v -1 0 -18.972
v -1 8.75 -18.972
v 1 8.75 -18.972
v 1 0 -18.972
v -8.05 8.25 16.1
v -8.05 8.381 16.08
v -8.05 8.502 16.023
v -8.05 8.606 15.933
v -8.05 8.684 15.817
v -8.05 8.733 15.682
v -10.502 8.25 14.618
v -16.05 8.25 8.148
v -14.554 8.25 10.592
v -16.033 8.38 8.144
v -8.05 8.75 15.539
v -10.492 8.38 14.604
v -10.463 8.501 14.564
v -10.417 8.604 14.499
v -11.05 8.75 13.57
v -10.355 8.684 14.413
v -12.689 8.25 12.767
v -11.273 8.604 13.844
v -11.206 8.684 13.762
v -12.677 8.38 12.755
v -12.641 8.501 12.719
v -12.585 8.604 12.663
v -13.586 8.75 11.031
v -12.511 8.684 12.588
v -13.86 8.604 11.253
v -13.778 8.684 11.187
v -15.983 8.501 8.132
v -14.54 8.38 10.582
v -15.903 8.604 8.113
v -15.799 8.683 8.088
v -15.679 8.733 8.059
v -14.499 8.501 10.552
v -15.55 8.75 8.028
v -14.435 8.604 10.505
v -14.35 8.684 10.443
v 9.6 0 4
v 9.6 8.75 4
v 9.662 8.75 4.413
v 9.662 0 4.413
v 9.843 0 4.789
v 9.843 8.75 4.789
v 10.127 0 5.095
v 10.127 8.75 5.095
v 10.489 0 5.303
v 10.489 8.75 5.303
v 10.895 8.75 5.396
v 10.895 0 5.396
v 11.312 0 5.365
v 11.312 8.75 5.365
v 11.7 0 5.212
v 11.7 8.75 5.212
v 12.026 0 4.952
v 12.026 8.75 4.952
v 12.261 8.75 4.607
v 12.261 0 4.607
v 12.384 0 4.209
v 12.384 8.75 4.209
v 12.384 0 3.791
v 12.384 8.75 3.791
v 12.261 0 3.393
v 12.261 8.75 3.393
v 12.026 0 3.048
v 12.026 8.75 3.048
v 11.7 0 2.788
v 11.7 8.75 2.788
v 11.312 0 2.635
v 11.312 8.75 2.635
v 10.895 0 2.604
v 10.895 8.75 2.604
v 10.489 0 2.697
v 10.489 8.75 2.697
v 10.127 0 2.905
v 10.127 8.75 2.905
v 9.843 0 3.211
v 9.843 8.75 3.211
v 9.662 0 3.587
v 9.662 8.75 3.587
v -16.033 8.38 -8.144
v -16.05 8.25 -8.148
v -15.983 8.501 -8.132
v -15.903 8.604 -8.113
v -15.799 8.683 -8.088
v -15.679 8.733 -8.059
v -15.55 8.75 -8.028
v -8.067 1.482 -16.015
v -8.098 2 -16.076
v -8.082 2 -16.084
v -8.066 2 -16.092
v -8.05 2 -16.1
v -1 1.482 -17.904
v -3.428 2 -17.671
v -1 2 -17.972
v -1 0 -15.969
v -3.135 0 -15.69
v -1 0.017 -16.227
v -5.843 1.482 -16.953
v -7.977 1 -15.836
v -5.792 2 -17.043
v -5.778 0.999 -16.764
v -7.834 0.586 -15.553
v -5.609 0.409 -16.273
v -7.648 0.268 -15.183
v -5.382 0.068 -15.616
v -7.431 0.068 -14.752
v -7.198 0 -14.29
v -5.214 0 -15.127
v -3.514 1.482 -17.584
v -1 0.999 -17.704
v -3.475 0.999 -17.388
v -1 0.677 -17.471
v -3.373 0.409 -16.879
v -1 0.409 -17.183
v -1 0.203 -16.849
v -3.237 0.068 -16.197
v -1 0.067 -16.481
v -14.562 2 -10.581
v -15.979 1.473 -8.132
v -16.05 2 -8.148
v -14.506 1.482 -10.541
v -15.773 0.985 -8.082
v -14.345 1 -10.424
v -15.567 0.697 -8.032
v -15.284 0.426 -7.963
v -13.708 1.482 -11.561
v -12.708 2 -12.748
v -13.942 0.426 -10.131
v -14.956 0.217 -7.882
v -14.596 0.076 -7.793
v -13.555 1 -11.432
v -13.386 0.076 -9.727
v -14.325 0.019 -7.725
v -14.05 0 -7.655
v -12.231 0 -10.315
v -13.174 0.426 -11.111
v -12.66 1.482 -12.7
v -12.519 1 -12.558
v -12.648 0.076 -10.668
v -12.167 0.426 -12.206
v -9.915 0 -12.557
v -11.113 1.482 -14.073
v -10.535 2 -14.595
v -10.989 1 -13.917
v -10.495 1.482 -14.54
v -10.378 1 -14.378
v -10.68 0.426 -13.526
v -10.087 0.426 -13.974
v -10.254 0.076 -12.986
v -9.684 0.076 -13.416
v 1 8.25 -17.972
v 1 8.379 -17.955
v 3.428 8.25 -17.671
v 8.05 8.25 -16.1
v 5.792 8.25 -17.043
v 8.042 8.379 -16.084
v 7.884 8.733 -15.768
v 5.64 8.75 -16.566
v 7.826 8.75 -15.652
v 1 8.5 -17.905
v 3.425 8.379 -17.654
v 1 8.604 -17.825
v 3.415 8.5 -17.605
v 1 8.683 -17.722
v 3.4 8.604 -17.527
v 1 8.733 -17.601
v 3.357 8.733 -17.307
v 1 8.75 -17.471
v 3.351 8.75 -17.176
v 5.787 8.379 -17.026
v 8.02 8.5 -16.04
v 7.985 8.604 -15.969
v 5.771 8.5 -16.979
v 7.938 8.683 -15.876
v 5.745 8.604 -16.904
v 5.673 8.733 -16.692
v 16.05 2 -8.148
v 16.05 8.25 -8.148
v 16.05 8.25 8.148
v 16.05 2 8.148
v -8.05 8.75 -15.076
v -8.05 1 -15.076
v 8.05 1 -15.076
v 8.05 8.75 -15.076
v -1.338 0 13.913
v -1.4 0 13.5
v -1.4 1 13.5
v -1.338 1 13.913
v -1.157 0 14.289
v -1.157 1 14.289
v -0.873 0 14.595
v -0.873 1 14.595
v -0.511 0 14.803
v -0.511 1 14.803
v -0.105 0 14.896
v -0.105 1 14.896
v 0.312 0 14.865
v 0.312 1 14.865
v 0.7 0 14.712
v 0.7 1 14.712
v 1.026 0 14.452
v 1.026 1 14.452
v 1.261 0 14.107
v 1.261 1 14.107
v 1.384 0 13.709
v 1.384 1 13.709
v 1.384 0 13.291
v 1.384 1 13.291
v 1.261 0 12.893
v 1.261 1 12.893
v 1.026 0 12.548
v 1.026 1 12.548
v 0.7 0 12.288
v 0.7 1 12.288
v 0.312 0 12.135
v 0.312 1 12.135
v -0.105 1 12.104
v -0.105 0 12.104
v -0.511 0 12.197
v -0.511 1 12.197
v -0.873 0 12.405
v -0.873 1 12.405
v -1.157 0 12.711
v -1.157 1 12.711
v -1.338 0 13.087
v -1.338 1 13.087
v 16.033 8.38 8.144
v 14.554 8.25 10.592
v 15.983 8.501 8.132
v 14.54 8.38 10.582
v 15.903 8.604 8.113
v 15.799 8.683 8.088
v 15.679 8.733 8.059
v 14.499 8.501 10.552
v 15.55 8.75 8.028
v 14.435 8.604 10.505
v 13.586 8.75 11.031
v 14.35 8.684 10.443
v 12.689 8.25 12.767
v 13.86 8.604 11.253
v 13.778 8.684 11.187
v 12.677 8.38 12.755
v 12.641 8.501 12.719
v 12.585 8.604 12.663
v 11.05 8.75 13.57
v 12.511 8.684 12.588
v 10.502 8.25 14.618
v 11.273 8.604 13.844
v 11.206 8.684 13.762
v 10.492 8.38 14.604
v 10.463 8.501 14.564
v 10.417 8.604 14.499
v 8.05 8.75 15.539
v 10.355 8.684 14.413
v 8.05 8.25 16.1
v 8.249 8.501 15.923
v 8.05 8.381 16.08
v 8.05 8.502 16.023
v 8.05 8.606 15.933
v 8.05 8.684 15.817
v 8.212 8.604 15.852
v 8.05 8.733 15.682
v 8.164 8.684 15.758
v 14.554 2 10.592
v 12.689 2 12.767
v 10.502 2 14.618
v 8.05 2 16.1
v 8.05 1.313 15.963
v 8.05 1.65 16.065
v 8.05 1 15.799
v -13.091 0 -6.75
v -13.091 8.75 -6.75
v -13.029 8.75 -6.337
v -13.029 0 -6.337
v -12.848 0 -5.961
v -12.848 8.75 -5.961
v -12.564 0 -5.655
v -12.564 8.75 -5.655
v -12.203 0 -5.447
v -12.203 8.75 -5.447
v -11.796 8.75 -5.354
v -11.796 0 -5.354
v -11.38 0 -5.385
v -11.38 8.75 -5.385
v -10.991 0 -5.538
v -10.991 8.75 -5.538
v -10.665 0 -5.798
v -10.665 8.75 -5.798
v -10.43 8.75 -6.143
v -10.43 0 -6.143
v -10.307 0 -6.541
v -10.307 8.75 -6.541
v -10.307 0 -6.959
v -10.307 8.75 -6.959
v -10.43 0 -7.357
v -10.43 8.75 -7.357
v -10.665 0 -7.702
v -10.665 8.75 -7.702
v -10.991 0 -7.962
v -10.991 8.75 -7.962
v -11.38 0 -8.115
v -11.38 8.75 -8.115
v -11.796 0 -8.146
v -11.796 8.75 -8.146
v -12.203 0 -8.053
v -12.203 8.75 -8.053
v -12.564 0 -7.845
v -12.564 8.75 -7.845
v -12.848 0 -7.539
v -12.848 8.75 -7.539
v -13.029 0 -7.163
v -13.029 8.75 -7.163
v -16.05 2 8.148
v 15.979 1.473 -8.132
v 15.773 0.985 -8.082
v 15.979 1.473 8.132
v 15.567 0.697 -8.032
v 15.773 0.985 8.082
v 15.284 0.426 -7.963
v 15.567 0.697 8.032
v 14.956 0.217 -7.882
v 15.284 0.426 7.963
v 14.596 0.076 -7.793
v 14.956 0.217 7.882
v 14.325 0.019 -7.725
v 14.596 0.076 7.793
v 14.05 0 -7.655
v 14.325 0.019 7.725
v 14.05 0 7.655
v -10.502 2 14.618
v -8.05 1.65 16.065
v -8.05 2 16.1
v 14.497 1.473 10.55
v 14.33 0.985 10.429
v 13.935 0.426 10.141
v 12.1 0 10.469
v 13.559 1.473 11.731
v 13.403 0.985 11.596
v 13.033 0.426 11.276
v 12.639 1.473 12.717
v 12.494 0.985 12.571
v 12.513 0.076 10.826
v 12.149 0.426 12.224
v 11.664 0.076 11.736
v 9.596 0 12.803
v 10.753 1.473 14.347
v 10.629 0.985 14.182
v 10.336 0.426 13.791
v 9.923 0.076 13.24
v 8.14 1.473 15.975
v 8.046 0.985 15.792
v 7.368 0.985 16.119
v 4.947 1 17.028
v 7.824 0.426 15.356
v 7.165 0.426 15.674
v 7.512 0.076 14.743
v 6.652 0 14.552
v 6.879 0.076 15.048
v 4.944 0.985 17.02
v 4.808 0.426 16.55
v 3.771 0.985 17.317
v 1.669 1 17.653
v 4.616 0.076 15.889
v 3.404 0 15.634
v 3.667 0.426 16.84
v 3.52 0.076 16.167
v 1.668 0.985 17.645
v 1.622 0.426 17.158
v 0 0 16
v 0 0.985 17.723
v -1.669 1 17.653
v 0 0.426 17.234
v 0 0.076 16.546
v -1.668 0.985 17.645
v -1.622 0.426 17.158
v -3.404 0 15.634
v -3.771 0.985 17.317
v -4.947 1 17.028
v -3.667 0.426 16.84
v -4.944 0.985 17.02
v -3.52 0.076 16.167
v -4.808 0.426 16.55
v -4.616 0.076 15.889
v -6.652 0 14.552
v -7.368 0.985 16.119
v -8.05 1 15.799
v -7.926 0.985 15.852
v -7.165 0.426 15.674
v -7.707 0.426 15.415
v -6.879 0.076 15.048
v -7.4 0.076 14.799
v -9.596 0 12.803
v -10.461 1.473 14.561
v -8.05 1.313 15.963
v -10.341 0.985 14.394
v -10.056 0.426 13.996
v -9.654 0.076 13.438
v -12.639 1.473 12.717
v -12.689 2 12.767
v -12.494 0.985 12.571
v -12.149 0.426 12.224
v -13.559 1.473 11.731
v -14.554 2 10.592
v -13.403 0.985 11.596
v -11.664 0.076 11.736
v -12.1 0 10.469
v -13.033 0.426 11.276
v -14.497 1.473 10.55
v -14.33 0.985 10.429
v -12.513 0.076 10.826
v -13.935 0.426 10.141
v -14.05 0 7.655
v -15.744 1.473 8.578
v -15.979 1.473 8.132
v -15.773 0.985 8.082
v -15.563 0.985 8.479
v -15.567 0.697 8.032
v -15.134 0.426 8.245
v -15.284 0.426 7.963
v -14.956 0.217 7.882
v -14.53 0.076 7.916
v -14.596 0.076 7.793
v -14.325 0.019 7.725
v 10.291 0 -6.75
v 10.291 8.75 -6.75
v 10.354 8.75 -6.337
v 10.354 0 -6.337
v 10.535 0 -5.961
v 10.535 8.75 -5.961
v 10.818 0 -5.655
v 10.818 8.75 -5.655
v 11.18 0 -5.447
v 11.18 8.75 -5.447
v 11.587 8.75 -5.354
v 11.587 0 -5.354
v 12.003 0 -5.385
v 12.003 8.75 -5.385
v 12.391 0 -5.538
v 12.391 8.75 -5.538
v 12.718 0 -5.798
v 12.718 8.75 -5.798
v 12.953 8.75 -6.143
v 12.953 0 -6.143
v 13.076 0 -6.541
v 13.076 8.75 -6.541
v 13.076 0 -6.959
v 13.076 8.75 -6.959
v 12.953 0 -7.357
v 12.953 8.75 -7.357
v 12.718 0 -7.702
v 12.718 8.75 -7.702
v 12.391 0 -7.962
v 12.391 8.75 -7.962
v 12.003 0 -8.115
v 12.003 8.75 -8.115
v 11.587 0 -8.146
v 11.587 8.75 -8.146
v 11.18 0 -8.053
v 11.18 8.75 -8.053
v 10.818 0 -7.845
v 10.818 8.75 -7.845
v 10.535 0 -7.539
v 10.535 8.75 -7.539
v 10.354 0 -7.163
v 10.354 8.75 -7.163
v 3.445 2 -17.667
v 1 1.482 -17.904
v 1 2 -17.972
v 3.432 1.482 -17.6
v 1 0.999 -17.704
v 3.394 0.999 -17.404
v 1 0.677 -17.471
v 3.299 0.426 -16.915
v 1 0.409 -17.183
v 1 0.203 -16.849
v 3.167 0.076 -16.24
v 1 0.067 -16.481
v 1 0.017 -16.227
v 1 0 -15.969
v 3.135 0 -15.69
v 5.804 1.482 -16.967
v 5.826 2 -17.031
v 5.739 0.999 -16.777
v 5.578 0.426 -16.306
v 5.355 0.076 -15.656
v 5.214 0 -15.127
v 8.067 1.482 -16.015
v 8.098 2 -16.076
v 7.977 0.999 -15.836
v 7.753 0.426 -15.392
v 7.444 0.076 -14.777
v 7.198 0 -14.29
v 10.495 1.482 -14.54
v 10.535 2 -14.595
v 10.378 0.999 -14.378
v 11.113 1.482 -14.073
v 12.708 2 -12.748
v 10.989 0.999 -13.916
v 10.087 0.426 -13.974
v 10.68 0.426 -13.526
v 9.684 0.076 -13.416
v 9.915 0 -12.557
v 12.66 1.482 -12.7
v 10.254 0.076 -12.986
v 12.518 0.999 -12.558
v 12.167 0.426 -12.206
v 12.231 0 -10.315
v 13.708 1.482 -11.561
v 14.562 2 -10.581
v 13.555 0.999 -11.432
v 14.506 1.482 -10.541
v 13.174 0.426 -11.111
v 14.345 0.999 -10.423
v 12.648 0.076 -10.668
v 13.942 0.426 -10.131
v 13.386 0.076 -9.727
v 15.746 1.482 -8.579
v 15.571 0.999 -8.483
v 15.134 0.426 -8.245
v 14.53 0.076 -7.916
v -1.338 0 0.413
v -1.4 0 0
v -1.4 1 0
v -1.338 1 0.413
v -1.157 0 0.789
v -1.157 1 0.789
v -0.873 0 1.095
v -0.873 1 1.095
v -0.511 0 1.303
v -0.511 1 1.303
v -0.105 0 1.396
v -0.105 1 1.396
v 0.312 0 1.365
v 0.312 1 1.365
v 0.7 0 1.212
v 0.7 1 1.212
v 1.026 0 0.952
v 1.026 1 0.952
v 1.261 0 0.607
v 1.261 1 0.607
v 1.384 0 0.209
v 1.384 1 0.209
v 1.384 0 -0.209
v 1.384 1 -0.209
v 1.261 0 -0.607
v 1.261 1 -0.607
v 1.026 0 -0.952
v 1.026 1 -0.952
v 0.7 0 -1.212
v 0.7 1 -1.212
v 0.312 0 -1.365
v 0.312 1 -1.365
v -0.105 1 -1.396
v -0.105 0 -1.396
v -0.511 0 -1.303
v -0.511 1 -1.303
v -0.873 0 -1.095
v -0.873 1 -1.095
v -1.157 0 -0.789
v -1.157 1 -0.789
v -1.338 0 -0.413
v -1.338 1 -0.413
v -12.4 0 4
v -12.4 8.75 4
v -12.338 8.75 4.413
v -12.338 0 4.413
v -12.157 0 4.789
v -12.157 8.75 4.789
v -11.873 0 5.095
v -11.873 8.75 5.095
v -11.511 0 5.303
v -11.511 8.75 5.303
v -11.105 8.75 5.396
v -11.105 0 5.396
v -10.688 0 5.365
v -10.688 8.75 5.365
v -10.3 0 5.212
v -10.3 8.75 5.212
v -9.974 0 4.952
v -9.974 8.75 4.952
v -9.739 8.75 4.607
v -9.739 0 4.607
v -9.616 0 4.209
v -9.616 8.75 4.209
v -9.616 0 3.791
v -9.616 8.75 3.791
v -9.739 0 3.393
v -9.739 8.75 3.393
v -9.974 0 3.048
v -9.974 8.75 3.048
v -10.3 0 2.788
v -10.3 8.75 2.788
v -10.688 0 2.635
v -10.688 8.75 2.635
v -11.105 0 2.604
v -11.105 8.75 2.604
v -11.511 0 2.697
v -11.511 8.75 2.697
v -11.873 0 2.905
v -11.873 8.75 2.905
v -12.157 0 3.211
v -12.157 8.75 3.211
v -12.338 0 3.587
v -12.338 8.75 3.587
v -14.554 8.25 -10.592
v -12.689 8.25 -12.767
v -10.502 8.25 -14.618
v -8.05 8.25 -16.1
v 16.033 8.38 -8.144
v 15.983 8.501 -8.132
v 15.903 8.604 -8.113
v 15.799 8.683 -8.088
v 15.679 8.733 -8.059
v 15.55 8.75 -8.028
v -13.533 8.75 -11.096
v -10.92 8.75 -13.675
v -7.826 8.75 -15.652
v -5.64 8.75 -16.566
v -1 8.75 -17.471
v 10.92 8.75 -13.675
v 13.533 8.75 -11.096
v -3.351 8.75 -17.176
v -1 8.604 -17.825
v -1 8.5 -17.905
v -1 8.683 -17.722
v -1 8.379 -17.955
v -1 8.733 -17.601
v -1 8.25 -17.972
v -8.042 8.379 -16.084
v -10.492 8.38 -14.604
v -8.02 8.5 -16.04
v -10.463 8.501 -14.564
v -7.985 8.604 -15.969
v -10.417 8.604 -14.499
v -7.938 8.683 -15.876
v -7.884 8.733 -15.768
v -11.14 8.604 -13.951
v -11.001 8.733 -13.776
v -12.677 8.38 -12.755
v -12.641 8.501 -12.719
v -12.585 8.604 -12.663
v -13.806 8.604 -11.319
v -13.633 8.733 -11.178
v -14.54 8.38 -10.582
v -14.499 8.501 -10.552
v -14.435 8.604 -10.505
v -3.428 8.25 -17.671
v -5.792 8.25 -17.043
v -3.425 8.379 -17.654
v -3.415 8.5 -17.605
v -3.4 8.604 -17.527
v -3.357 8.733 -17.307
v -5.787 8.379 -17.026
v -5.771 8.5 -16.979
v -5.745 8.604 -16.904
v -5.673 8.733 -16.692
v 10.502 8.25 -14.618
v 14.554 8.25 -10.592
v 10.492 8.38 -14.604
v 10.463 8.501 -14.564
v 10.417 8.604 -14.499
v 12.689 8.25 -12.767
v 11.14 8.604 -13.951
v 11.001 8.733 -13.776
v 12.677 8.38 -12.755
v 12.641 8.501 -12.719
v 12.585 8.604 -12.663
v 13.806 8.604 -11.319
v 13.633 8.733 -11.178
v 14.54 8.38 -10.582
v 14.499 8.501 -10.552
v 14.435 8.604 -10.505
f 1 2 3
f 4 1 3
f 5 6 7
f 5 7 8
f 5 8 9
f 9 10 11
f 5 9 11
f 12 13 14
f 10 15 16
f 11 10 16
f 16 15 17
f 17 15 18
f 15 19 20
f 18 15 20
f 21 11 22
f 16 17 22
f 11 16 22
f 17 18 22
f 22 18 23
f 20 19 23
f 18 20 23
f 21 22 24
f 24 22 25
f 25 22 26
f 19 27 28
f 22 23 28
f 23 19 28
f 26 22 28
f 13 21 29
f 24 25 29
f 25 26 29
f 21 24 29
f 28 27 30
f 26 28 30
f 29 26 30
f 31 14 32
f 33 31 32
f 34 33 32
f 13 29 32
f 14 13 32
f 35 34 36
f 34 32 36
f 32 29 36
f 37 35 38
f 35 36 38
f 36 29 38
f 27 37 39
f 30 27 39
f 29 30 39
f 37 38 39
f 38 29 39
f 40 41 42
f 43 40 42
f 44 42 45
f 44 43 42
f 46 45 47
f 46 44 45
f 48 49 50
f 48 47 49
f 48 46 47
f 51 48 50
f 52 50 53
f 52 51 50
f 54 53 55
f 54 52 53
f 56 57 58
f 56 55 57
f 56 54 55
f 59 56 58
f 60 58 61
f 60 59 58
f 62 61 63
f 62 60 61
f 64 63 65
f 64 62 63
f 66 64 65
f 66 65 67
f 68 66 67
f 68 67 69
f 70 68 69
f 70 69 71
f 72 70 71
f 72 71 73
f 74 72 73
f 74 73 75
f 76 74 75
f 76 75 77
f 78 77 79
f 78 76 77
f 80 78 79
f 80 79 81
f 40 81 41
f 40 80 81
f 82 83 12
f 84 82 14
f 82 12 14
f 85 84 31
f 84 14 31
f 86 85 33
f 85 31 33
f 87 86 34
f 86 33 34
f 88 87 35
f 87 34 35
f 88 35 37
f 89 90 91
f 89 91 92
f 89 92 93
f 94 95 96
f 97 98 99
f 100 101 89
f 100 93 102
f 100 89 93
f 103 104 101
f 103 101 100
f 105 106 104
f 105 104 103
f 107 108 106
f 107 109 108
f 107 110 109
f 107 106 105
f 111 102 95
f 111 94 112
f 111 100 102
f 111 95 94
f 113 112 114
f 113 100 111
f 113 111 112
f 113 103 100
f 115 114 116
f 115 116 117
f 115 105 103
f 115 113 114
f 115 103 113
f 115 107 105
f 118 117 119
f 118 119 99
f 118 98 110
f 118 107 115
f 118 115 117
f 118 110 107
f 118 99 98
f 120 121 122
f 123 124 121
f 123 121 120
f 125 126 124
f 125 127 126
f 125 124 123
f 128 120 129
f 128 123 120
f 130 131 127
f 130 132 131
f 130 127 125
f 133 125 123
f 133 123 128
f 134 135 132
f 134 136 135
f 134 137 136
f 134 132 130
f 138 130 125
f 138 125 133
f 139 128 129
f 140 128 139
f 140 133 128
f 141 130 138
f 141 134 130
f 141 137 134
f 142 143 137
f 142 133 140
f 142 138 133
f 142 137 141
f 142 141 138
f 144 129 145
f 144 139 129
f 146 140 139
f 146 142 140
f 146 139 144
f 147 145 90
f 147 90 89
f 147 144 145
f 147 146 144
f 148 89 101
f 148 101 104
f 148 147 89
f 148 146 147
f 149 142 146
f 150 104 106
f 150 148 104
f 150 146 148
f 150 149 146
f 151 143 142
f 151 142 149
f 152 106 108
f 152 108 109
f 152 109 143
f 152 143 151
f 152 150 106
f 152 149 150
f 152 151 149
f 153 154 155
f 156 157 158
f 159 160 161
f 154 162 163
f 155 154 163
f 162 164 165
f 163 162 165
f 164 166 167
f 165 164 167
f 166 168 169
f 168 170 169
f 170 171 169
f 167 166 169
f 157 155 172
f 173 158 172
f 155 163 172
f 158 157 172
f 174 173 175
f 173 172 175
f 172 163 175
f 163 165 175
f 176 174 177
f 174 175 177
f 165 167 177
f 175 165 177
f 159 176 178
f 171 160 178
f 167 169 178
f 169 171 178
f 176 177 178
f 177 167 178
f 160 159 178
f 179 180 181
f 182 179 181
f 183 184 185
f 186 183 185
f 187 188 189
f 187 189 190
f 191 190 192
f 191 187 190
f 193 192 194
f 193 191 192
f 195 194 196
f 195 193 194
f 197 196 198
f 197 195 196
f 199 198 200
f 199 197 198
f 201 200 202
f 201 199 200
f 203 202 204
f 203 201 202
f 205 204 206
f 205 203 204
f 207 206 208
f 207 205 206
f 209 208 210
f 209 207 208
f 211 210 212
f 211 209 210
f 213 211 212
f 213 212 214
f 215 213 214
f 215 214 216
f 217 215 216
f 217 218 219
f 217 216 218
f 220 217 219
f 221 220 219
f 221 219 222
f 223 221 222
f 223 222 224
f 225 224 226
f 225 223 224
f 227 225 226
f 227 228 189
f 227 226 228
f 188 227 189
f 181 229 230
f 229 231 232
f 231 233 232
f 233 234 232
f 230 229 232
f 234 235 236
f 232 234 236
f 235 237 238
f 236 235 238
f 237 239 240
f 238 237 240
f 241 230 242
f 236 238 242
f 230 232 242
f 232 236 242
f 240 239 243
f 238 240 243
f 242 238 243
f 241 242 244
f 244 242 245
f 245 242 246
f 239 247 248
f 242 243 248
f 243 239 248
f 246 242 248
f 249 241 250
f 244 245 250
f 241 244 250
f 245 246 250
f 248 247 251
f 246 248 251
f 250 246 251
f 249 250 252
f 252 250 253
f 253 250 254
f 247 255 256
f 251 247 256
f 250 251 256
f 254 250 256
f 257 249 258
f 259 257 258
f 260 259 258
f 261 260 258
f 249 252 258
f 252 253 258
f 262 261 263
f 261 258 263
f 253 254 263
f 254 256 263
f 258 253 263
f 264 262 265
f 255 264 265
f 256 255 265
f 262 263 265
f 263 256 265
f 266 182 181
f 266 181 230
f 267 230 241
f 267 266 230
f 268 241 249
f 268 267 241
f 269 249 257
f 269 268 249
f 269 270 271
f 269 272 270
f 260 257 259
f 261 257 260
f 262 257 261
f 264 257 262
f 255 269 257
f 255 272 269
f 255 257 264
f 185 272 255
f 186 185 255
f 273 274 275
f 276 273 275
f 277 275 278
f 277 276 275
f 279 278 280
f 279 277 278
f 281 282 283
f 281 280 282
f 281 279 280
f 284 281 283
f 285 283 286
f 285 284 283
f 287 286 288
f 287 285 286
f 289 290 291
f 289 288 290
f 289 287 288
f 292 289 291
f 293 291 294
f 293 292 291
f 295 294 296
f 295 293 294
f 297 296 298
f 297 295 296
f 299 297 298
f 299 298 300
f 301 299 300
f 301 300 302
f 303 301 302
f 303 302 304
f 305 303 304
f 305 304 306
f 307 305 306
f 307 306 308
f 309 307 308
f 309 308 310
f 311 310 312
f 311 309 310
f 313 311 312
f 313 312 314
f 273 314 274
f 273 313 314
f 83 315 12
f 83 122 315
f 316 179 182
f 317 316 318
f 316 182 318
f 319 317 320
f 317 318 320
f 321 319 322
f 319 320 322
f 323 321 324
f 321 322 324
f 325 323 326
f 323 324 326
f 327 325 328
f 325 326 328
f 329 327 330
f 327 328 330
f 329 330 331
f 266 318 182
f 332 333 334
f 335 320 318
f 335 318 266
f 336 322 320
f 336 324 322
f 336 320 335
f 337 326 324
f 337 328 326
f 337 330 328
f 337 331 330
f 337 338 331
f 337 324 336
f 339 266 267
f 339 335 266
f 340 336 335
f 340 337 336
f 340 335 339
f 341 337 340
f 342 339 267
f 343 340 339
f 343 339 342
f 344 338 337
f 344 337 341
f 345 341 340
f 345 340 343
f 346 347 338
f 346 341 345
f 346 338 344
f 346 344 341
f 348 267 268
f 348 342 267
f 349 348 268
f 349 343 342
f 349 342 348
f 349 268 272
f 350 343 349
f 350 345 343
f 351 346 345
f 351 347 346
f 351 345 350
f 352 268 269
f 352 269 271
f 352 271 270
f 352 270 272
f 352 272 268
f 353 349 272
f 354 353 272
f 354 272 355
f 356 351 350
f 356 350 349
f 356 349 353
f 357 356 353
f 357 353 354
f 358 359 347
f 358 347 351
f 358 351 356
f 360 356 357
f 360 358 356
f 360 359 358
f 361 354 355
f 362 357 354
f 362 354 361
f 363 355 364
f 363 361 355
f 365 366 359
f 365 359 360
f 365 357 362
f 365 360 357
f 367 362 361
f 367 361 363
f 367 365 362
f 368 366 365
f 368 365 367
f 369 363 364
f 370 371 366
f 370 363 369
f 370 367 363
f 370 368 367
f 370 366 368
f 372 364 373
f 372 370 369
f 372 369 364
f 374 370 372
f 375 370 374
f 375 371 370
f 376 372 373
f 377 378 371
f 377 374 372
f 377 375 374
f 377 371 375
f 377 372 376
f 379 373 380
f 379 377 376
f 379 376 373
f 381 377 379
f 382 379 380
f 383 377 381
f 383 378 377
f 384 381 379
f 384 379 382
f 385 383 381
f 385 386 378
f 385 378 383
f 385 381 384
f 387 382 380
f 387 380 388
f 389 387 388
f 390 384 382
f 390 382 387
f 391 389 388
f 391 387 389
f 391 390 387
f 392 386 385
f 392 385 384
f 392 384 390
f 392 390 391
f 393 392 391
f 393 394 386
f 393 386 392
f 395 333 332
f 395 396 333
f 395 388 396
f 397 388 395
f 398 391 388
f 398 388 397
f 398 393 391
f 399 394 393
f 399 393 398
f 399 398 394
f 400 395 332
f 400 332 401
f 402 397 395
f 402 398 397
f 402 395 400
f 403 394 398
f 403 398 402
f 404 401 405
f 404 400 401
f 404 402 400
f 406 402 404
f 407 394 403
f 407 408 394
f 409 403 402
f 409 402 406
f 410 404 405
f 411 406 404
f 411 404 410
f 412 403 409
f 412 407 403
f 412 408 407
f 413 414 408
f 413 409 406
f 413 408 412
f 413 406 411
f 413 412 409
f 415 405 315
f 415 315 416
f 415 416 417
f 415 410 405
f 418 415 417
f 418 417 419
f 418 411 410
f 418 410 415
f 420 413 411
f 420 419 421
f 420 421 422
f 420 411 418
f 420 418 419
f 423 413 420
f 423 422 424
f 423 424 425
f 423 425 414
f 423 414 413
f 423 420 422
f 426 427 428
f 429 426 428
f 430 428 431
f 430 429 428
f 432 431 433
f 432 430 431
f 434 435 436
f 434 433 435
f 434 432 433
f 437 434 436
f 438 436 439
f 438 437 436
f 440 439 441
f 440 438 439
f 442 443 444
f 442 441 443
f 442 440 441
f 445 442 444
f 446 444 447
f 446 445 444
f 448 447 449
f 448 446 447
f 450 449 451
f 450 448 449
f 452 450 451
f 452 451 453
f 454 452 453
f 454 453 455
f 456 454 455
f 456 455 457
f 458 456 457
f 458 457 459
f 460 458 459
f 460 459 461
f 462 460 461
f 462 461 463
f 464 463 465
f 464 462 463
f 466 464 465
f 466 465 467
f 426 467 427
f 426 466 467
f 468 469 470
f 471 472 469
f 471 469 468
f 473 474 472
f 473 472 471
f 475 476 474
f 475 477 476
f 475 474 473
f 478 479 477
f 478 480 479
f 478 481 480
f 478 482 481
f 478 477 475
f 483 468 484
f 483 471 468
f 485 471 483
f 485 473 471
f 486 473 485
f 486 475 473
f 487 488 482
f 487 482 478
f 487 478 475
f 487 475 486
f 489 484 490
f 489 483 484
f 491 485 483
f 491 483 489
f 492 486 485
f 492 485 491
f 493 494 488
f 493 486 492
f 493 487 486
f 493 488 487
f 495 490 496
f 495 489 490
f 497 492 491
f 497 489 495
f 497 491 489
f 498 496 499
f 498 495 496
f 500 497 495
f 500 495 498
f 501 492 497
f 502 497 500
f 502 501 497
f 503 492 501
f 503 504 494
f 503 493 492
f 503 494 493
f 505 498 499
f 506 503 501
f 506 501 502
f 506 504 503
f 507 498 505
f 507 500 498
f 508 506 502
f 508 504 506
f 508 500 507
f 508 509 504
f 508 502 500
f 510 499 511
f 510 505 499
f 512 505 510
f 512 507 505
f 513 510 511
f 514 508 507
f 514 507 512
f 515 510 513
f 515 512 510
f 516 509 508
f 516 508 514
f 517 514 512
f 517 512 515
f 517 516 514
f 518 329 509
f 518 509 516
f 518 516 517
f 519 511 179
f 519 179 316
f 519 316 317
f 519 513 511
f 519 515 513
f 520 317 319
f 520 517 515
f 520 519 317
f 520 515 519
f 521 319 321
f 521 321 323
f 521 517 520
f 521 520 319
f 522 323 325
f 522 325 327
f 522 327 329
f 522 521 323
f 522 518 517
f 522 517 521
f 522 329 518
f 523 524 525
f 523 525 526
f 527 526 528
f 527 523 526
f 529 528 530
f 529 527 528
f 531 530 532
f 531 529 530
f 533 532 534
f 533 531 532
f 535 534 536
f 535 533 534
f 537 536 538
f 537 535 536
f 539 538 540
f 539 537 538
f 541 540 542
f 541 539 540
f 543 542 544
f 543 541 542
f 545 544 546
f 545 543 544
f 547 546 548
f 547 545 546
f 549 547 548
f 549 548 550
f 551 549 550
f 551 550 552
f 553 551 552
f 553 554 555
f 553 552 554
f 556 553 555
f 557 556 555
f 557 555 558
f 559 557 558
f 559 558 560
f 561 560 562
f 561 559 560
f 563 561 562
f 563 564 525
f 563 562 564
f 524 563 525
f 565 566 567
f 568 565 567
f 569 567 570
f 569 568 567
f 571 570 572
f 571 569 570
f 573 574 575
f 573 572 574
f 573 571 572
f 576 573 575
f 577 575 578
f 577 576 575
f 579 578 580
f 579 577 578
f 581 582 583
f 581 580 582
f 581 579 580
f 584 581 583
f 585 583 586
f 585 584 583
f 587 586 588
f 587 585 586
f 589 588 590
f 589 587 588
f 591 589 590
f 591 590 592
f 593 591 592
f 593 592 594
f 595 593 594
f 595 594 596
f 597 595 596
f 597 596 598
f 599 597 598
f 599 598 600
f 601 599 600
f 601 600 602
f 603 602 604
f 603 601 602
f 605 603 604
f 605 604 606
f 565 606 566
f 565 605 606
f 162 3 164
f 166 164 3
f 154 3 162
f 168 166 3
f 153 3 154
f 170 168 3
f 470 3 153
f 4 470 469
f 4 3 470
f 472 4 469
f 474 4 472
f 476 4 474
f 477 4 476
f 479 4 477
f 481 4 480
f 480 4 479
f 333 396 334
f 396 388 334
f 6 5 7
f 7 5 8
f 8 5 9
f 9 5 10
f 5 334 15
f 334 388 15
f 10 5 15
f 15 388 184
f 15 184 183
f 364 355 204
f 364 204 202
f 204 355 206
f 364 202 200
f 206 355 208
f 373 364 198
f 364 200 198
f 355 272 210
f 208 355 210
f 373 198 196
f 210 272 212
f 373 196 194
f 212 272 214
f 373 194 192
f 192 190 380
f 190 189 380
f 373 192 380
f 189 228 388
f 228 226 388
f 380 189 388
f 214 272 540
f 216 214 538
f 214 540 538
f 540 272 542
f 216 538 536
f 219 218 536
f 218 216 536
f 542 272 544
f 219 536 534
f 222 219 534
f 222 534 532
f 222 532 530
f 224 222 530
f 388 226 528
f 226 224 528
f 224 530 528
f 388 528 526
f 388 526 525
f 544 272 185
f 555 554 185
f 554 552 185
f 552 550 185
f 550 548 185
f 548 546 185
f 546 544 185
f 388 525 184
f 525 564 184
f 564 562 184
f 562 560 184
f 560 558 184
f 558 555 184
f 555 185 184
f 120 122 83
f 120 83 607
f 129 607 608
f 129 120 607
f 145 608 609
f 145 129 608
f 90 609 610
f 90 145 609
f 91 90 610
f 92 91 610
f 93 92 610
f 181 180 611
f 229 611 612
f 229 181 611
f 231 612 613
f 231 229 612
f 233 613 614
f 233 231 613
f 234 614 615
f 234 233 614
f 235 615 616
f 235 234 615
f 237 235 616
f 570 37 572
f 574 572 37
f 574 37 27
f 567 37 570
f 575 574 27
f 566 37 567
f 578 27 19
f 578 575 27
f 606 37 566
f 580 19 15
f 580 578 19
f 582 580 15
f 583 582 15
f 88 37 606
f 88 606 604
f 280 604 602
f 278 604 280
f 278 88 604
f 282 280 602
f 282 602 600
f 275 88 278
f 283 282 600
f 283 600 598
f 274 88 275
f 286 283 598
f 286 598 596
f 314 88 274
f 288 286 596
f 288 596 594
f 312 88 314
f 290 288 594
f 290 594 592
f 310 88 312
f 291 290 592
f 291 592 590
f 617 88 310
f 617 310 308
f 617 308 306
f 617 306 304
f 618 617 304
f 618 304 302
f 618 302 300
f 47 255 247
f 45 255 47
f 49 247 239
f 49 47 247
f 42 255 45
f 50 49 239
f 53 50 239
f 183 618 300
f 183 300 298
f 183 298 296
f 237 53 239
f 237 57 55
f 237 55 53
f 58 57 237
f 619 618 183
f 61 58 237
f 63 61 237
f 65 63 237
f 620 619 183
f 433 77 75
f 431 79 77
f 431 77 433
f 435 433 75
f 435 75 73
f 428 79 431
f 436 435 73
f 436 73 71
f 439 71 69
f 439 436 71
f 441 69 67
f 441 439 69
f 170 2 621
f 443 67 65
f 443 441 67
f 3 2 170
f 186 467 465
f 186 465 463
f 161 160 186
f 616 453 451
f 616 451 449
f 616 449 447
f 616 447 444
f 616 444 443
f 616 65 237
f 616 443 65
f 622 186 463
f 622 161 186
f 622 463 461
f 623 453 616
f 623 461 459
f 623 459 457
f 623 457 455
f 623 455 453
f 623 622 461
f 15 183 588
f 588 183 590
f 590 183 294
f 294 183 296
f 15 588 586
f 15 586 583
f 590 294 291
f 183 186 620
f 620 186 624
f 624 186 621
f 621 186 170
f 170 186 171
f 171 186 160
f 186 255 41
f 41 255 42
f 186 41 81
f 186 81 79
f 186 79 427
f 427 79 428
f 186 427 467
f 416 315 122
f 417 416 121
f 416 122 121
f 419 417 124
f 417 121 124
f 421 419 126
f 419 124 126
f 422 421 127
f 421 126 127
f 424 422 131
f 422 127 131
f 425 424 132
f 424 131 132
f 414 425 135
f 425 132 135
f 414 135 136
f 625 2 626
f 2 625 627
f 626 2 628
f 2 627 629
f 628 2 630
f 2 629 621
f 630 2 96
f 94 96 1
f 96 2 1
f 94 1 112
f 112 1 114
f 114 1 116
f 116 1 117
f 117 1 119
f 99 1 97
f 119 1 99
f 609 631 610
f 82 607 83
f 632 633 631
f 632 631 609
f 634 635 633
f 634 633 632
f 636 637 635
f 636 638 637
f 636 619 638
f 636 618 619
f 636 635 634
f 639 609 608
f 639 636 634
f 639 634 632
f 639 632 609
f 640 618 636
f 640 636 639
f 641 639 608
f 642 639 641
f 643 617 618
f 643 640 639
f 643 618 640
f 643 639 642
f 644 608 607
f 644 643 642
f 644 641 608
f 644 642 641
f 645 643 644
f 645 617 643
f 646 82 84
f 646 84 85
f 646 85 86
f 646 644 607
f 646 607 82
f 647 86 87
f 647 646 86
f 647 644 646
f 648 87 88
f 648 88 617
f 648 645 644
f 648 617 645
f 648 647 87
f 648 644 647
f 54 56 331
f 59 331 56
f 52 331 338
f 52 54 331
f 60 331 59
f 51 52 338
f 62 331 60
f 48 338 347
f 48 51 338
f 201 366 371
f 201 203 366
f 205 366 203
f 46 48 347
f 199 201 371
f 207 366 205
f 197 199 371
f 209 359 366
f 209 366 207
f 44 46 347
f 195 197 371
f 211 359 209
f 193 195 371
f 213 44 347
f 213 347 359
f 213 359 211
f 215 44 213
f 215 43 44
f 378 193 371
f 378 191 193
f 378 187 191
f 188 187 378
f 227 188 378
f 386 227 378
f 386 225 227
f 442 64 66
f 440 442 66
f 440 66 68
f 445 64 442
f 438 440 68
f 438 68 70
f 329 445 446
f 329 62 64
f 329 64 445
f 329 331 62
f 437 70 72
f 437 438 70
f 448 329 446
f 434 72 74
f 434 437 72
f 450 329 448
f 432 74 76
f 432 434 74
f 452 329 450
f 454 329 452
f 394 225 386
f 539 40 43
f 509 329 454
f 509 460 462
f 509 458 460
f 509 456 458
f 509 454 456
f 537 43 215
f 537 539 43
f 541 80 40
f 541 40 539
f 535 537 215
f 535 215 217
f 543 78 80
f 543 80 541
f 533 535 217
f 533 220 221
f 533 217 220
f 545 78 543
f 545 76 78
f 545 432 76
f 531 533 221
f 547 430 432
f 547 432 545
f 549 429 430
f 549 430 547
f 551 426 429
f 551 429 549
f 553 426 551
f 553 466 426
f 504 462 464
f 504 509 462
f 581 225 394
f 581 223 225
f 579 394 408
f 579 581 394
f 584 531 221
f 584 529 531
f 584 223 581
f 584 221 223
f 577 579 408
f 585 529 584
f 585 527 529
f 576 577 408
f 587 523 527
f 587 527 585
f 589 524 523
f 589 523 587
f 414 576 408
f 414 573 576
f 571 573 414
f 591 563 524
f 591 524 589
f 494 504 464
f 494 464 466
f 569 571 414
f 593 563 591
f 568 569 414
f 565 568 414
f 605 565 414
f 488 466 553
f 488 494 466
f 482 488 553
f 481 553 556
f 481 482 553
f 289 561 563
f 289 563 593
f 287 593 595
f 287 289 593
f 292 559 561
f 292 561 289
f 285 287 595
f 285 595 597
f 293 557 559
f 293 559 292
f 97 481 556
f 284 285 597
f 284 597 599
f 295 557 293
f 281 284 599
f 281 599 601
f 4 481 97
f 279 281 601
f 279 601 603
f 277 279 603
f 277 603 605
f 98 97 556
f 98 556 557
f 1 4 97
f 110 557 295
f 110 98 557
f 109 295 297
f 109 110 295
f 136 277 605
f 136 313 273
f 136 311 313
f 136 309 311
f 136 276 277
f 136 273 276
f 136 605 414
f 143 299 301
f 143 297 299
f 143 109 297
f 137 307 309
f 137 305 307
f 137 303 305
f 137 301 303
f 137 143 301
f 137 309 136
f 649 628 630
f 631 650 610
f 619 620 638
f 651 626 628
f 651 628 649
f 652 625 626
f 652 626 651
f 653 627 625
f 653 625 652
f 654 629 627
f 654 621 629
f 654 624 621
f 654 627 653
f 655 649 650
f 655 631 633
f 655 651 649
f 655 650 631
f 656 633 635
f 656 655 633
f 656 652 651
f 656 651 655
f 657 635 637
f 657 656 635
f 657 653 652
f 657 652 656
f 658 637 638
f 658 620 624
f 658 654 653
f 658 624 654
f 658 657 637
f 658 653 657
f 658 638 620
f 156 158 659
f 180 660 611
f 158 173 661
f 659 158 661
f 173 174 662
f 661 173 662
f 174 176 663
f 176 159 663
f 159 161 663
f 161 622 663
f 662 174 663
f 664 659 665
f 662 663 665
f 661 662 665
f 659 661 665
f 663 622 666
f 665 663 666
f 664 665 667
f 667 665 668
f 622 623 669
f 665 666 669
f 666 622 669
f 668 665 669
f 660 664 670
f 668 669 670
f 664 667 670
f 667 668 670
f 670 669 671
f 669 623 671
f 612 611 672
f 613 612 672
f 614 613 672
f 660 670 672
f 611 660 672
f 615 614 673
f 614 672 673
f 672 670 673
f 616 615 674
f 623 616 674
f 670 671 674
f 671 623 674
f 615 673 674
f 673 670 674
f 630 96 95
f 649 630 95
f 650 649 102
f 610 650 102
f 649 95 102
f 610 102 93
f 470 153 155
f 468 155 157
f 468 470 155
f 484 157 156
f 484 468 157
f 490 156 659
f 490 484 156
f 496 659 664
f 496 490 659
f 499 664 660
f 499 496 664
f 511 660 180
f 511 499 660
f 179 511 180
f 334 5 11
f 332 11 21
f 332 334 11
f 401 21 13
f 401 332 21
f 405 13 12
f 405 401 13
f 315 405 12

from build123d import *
from build123d.topology import SkipClean

# Parameters (mm, degrees)
BOSS_EXTRUDE1_DEPTH      = 1
BOSS_EXTRUDE2_DEPTH      = 18
BOSS_EXTRUDE2_DEPTH_BACK = 18.972201
SKETCH2_W                = 8
SKETCH2_H                = 7.75
SKETCH3_R                = 59.910539196
CUT_EXTRUDE1_DEPTH       = 28.577289765
CUT_EXTRUDE2_DEPTH       = 28.577289597
CUT_EXTRUDE2_DEPTH_BACK  = 28.577289597
SKETCH5_R                = 1.4
BOSS_EXTRUDE3_DEPTH      = 8.75
CUT_EXTRUDE3_DEPTH       = 28.276489905
FILLET1_R                = 2
FILLET2_R                = 0.5


with BuildPart() as part:
    # Sketch1 → Boss-Extrude1 (new body)
    with BuildSketch(Plane(origin=(0, 0, 0), x_dir=(1, 0, 0), z_dir=(0, 1, 0))):
        with BuildLine():
            Line((-1, 17.972200756), (-1, 18.972200756))
            Line((-1, 18.972200756), (1, 18.972200756))
            Line((1, 18.972200756), (1, 17.972200756))
            ThreePointArc((1, 17.972200756), (0, -18), (-1, 17.972200756))
        make_face()
    extrude(amount=BOSS_EXTRUDE1_DEPTH)

    # Sketch2 → Boss-Extrude2 (add, two sides: drawn at the far end of the back side and taken through both)
    with BuildSketch(Plane.XY.offset(-BOSS_EXTRUDE2_DEPTH_BACK)):
        with Locations((-12.05, 4.875)):
            Rectangle(SKETCH2_W, SKETCH2_H)
        with Locations((12.05, 4.875)):
            Rectangle(SKETCH2_W, SKETCH2_H)
    extrude(amount=BOSS_EXTRUDE2_DEPTH + BOSS_EXTRUDE2_DEPTH_BACK)

    # Sketch3 → Cut-Extrude1 (cut, through all)
    with BuildSketch(Plane.XZ):
        Circle(SKETCH3_R)
        with BuildLine():
            Line((-1, -17.972200756), (-1, -18.972200756))
            Line((-1, -18.972200756), (1, -18.972200756))
            Line((1, -18.972200756), (1, -17.972200756))
            ThreePointArc((1, -17.972200756), (0, 18), (-1, -17.972200756))
        make_face(mode=Mode.SUBTRACT)
    extrude(amount=-CUT_EXTRUDE1_DEPTH, mode=Mode.SUBTRACT)

    # Sketch5 → Cut-Extrude2 (cut, two sides: drawn at the far end of the back side and taken through both)
    with BuildSketch(Plane(origin=(0, 0, 0), x_dir=(1, 0, 0), z_dir=(0, 1, 0)).offset(-CUT_EXTRUDE2_DEPTH_BACK)):
        with Locations(Location((0, 0, 0), (0, 0, 180))):
            Circle(SKETCH5_R)
        with Locations(Location((11, -4, 0), (0, 0, 180))):
            Circle(SKETCH5_R)
        with Locations(Location((-11, -4, 0), (0, 0, 180))):
            Circle(SKETCH5_R)
        with Locations(Location((-11.691342951, 6.75, 0), (0, 0, 180))):
            Circle(SKETCH5_R)
        with Locations(Location((0, -13.5, 0), (0, 0, 180))):
            Circle(SKETCH5_R)
        with Locations(Location((11.691342951, 6.75, 0), (0, 0, 180))):
            Circle(SKETCH5_R)
    extrude(amount=CUT_EXTRUDE2_DEPTH + CUT_EXTRUDE2_DEPTH_BACK, mode=Mode.SUBTRACT)

    # Sketch6 → Boss-Extrude3 (add)
    with SkipClean():  # the faces are left unmerged after this step: merging them gives an invalid solid
        with BuildSketch(Plane.XZ):
            with BuildLine():
                Line((-8.097530488, -15.075758147), (8.097530488, -15.075758147))
                Line((8.097530488, -15.075758147), (8.097530488, -16.075758147))
                ThreePointArc((8.097530488, -16.075758147), (4.646545909, -17.389928439), (1, -17.972200756))
                Line((1, -17.972200756), (1, -18.972200756))
                Line((1, -18.972200756), (-1, -18.972200756))
                Line((-1, -18.972200756), (-1, -17.972200756))
                ThreePointArc((-1, -17.972200756), (-4.646545909, -17.389928439), (-8.097530488, -16.075758147))
                Line((-8.097530488, -16.075758147), (-8.097530488, -15.075758147))
            make_face()
        extrude(amount=-BOSS_EXTRUDE3_DEPTH)
    add(part.part.scale(1), mode=Mode.REPLACE)  # the faces are merged on a copy

    # Sketch7 → Cut-Extrude3 (cut, through all)
    with BuildSketch(Plane(origin=(0, 1, 0), x_dir=(1, 0, 0), z_dir=(0, 1, 0))):
        with BuildLine():
            Line((16.05, 8.148466113), (16.05, -8.148466113))
            ThreePointArc((16.05, -8.148466113), (18, 0), (16.05, 8.148466113))
        make_face()
        with BuildLine():
            Line((-16.05, -8.148466113), (-16.05, 8.148466113))
            ThreePointArc((-16.05, 8.148466113), (-18, 0), (-16.05, -8.148466113))
        make_face()
    extrude(amount=-CUT_EXTRUDE3_DEPTH, mode=Mode.SUBTRACT)

    # Fillet1
    # the kernel refuses this fillet: 2 mm, written as the material it takes off along each edge
    with BuildSketch(Plane(origin=(16.05, 0, 13.148466113), x_dir=(-1, 0, 0), z_dir=(0, 0, -1)), Plane(origin=(-16.05, 0, -13.148466113), x_dir=(1, 0, 0), z_dir=(0, 0, 1))) as fillet1_piece_1:
        with BuildLine():
            CenterArc((FILLET1_R, FILLET1_R), FILLET1_R, 180, 90)
            Line((0, FILLET1_R), (0, 0))
            Line((0, 0), (FILLET1_R, 0))
        make_face()
    extrude(amount=26.296932227, mode=Mode.SUBTRACT)
    with BuildSketch(Plane(origin=(0, 0, 0), x_dir=(0.9816654427410076, 0, 0.19061206291339847), z_dir=(0.19061206291339847, 0, -0.9816654427410076))) as fillet1_piece_2:
        with BuildLine():
            CenterArc((18 - FILLET1_R, -FILLET1_R), FILLET1_R, 0, 90)
            Line((18, -FILLET1_R), (18, 0))
            Line((18, 0), (18 - FILLET1_R, 0))
        make_face()
    revolve(axis=Axis((0, 0, 0), (0, -1, 0)), revolution_arc=158.022988726, mode=Mode.SUBTRACT)
    with BuildSketch(Plane(origin=(0, 0, 0), x_dir=(0.4498628048748618, 0, -0.8930976748318865), z_dir=(-0.8930976748318865, 0, -0.4498628048748618))) as fillet1_piece_3:
        with BuildLine():
            CenterArc((18 - FILLET1_R, -FILLET1_R), FILLET1_R, 0, 90)
            Line((18, -FILLET1_R), (18, 0))
            Line((18, 0), (18 - FILLET1_R, 0))
        make_face()
    revolve(axis=Axis((0, 0, 0), (0, -1, 0)), revolution_arc=52.265087313, mode=Mode.SUBTRACT)
    with BuildSketch(Plane(origin=(0, 0, 0), x_dir=(-0.9816270812345659, 0, -0.19080952121659656), z_dir=(-0.19080952121659656, 0, 0.9816270812345659))) as fillet1_piece_4:
        with BuildLine():
            CenterArc((18 - FILLET1_R, -FILLET1_R), FILLET1_R, 0, 90)
            Line((18 - FILLET1_R, 0), (18, 0))
            Line((18, 0), (18, -FILLET1_R))
        make_face()
    revolve(axis=Axis((0, 0, 0), (0, -1, 0)), revolution_arc=52.265087313, mode=Mode.SUBTRACT)
    with BuildSketch(Plane(origin=(0, 0, 0), x_dir=(-0.44986280487485913, 0, -0.8930976748318878), z_dir=(-0.8930976748318878, 0, 0.44986280487485913))) as fillet1_piece_5_section:
        with BuildLine():
            CenterArc((18 - FILLET1_R, -FILLET1_R), FILLET1_R, 0, 90)
            Line((18 - FILLET1_R, 0), (18, 0))
            Line((18, 0), (18, -FILLET1_R))
        make_face()
    fillet1_piece_5 = revolve(axis=Axis((0, 0, 0), (0, -1, 0)), revolution_arc=39.46607541, mode=Mode.PRIVATE)
    fillet1_piece_5 = split(fillet1_piece_5, bisect_by=Plane(origin=(-1, 0.459921415, -16.842636156), z_dir=(-1, 0, 0)), keep=Keep.TOP, mode=Mode.PRIVATE)
    add(fillet1_piece_5, mode=Mode.SUBTRACT)
    with BuildSketch(Plane(origin=(0, 0, 0), x_dir=(-0.44986280487485913, 0, -0.8930976748318878), z_dir=(-0.8930976748318878, 0, 0.44986280487485913))) as fillet1_piece_6_section:
        with BuildLine():
            CenterArc((18 - FILLET1_R, -FILLET1_R), FILLET1_R, 0, 90)
            Line((18 - FILLET1_R, 0), (18, 0))
            Line((18, 0), (18, -FILLET1_R))
        make_face()
    fillet1_piece_6 = revolve(axis=Axis((0, 0, 0), (0, -1, 0)), revolution_arc=39.46607541, mode=Mode.PRIVATE)
    fillet1_piece_6 = split(fillet1_piece_6, bisect_by=Plane(origin=(1, 0.461212135, -17.370872929), z_dir=(1, 0, 0)), keep=Keep.TOP, mode=Mode.PRIVATE)
    add(fillet1_piece_6, mode=Mode.SUBTRACT)
    with BuildSketch(Plane(origin=(0, 0, 0), x_dir=(-0.22037727986092012, 0, -0.9754147089936167), z_dir=(-0.9754147089936167, 0, 0.22037727986092012))) as fillet1_piece_7_section:
        with BuildLine():
            CenterArc((18 - FILLET1_R, -FILLET1_R), FILLET1_R, 0, 90)
            Line((18, -FILLET1_R), (18, 0))
            Line((18, 0), (18 - FILLET1_R, 0))
        make_face()
    fillet1_piece_7 = revolve(axis=Axis((0, 0, 0), (0, -1, 0)), revolution_arc=39.46607541, mode=Mode.PRIVATE)
    fillet1_piece_7 = split(fillet1_piece_7, bisect_by=Plane(origin=(-1, 0.461212076, -17.370872697), z_dir=(-1, 0, 0)), keep=Keep.TOP, mode=Mode.PRIVATE)
    add(fillet1_piece_7, mode=Mode.SUBTRACT)
    with BuildSketch(Plane(origin=(0, 0, 0), x_dir=(-0.22037727986092012, 0, -0.9754147089936167), z_dir=(-0.9754147089936167, 0, 0.22037727986092012))) as fillet1_piece_8_section:
        with BuildLine():
            CenterArc((18 - FILLET1_R, -FILLET1_R), FILLET1_R, 0, 90)
            Line((18, -FILLET1_R), (18, 0))
            Line((18, 0), (18 - FILLET1_R, 0))
        make_face()
    fillet1_piece_8 = revolve(axis=Axis((0, 0, 0), (0, -1, 0)), revolution_arc=39.46607541, mode=Mode.PRIVATE)
    fillet1_piece_8 = split(fillet1_piece_8, bisect_by=Plane(origin=(1, 0.459921447, -16.842636316), z_dir=(1, 0, 0)), keep=Keep.TOP, mode=Mode.PRIVATE)
    add(fillet1_piece_8, mode=Mode.SUBTRACT)

    # Fillet2
    fillet2_edges = [part.edges().sort_by_distance(p)[0] for p in [
        (16.05, 8.75, 0),
        (-16.05, 8.75, 0),
        (-12.688880148, 8.75, 12.766844582),
        (-12.707725875, 8.75, -12.748086252),
        (12.688880148, 8.75, 12.766844582),
        (12.707725875, 8.75, -12.748086252),
    ]]
    fillet(fillet2_edges, radius=FILLET2_R)


solid = part.part
